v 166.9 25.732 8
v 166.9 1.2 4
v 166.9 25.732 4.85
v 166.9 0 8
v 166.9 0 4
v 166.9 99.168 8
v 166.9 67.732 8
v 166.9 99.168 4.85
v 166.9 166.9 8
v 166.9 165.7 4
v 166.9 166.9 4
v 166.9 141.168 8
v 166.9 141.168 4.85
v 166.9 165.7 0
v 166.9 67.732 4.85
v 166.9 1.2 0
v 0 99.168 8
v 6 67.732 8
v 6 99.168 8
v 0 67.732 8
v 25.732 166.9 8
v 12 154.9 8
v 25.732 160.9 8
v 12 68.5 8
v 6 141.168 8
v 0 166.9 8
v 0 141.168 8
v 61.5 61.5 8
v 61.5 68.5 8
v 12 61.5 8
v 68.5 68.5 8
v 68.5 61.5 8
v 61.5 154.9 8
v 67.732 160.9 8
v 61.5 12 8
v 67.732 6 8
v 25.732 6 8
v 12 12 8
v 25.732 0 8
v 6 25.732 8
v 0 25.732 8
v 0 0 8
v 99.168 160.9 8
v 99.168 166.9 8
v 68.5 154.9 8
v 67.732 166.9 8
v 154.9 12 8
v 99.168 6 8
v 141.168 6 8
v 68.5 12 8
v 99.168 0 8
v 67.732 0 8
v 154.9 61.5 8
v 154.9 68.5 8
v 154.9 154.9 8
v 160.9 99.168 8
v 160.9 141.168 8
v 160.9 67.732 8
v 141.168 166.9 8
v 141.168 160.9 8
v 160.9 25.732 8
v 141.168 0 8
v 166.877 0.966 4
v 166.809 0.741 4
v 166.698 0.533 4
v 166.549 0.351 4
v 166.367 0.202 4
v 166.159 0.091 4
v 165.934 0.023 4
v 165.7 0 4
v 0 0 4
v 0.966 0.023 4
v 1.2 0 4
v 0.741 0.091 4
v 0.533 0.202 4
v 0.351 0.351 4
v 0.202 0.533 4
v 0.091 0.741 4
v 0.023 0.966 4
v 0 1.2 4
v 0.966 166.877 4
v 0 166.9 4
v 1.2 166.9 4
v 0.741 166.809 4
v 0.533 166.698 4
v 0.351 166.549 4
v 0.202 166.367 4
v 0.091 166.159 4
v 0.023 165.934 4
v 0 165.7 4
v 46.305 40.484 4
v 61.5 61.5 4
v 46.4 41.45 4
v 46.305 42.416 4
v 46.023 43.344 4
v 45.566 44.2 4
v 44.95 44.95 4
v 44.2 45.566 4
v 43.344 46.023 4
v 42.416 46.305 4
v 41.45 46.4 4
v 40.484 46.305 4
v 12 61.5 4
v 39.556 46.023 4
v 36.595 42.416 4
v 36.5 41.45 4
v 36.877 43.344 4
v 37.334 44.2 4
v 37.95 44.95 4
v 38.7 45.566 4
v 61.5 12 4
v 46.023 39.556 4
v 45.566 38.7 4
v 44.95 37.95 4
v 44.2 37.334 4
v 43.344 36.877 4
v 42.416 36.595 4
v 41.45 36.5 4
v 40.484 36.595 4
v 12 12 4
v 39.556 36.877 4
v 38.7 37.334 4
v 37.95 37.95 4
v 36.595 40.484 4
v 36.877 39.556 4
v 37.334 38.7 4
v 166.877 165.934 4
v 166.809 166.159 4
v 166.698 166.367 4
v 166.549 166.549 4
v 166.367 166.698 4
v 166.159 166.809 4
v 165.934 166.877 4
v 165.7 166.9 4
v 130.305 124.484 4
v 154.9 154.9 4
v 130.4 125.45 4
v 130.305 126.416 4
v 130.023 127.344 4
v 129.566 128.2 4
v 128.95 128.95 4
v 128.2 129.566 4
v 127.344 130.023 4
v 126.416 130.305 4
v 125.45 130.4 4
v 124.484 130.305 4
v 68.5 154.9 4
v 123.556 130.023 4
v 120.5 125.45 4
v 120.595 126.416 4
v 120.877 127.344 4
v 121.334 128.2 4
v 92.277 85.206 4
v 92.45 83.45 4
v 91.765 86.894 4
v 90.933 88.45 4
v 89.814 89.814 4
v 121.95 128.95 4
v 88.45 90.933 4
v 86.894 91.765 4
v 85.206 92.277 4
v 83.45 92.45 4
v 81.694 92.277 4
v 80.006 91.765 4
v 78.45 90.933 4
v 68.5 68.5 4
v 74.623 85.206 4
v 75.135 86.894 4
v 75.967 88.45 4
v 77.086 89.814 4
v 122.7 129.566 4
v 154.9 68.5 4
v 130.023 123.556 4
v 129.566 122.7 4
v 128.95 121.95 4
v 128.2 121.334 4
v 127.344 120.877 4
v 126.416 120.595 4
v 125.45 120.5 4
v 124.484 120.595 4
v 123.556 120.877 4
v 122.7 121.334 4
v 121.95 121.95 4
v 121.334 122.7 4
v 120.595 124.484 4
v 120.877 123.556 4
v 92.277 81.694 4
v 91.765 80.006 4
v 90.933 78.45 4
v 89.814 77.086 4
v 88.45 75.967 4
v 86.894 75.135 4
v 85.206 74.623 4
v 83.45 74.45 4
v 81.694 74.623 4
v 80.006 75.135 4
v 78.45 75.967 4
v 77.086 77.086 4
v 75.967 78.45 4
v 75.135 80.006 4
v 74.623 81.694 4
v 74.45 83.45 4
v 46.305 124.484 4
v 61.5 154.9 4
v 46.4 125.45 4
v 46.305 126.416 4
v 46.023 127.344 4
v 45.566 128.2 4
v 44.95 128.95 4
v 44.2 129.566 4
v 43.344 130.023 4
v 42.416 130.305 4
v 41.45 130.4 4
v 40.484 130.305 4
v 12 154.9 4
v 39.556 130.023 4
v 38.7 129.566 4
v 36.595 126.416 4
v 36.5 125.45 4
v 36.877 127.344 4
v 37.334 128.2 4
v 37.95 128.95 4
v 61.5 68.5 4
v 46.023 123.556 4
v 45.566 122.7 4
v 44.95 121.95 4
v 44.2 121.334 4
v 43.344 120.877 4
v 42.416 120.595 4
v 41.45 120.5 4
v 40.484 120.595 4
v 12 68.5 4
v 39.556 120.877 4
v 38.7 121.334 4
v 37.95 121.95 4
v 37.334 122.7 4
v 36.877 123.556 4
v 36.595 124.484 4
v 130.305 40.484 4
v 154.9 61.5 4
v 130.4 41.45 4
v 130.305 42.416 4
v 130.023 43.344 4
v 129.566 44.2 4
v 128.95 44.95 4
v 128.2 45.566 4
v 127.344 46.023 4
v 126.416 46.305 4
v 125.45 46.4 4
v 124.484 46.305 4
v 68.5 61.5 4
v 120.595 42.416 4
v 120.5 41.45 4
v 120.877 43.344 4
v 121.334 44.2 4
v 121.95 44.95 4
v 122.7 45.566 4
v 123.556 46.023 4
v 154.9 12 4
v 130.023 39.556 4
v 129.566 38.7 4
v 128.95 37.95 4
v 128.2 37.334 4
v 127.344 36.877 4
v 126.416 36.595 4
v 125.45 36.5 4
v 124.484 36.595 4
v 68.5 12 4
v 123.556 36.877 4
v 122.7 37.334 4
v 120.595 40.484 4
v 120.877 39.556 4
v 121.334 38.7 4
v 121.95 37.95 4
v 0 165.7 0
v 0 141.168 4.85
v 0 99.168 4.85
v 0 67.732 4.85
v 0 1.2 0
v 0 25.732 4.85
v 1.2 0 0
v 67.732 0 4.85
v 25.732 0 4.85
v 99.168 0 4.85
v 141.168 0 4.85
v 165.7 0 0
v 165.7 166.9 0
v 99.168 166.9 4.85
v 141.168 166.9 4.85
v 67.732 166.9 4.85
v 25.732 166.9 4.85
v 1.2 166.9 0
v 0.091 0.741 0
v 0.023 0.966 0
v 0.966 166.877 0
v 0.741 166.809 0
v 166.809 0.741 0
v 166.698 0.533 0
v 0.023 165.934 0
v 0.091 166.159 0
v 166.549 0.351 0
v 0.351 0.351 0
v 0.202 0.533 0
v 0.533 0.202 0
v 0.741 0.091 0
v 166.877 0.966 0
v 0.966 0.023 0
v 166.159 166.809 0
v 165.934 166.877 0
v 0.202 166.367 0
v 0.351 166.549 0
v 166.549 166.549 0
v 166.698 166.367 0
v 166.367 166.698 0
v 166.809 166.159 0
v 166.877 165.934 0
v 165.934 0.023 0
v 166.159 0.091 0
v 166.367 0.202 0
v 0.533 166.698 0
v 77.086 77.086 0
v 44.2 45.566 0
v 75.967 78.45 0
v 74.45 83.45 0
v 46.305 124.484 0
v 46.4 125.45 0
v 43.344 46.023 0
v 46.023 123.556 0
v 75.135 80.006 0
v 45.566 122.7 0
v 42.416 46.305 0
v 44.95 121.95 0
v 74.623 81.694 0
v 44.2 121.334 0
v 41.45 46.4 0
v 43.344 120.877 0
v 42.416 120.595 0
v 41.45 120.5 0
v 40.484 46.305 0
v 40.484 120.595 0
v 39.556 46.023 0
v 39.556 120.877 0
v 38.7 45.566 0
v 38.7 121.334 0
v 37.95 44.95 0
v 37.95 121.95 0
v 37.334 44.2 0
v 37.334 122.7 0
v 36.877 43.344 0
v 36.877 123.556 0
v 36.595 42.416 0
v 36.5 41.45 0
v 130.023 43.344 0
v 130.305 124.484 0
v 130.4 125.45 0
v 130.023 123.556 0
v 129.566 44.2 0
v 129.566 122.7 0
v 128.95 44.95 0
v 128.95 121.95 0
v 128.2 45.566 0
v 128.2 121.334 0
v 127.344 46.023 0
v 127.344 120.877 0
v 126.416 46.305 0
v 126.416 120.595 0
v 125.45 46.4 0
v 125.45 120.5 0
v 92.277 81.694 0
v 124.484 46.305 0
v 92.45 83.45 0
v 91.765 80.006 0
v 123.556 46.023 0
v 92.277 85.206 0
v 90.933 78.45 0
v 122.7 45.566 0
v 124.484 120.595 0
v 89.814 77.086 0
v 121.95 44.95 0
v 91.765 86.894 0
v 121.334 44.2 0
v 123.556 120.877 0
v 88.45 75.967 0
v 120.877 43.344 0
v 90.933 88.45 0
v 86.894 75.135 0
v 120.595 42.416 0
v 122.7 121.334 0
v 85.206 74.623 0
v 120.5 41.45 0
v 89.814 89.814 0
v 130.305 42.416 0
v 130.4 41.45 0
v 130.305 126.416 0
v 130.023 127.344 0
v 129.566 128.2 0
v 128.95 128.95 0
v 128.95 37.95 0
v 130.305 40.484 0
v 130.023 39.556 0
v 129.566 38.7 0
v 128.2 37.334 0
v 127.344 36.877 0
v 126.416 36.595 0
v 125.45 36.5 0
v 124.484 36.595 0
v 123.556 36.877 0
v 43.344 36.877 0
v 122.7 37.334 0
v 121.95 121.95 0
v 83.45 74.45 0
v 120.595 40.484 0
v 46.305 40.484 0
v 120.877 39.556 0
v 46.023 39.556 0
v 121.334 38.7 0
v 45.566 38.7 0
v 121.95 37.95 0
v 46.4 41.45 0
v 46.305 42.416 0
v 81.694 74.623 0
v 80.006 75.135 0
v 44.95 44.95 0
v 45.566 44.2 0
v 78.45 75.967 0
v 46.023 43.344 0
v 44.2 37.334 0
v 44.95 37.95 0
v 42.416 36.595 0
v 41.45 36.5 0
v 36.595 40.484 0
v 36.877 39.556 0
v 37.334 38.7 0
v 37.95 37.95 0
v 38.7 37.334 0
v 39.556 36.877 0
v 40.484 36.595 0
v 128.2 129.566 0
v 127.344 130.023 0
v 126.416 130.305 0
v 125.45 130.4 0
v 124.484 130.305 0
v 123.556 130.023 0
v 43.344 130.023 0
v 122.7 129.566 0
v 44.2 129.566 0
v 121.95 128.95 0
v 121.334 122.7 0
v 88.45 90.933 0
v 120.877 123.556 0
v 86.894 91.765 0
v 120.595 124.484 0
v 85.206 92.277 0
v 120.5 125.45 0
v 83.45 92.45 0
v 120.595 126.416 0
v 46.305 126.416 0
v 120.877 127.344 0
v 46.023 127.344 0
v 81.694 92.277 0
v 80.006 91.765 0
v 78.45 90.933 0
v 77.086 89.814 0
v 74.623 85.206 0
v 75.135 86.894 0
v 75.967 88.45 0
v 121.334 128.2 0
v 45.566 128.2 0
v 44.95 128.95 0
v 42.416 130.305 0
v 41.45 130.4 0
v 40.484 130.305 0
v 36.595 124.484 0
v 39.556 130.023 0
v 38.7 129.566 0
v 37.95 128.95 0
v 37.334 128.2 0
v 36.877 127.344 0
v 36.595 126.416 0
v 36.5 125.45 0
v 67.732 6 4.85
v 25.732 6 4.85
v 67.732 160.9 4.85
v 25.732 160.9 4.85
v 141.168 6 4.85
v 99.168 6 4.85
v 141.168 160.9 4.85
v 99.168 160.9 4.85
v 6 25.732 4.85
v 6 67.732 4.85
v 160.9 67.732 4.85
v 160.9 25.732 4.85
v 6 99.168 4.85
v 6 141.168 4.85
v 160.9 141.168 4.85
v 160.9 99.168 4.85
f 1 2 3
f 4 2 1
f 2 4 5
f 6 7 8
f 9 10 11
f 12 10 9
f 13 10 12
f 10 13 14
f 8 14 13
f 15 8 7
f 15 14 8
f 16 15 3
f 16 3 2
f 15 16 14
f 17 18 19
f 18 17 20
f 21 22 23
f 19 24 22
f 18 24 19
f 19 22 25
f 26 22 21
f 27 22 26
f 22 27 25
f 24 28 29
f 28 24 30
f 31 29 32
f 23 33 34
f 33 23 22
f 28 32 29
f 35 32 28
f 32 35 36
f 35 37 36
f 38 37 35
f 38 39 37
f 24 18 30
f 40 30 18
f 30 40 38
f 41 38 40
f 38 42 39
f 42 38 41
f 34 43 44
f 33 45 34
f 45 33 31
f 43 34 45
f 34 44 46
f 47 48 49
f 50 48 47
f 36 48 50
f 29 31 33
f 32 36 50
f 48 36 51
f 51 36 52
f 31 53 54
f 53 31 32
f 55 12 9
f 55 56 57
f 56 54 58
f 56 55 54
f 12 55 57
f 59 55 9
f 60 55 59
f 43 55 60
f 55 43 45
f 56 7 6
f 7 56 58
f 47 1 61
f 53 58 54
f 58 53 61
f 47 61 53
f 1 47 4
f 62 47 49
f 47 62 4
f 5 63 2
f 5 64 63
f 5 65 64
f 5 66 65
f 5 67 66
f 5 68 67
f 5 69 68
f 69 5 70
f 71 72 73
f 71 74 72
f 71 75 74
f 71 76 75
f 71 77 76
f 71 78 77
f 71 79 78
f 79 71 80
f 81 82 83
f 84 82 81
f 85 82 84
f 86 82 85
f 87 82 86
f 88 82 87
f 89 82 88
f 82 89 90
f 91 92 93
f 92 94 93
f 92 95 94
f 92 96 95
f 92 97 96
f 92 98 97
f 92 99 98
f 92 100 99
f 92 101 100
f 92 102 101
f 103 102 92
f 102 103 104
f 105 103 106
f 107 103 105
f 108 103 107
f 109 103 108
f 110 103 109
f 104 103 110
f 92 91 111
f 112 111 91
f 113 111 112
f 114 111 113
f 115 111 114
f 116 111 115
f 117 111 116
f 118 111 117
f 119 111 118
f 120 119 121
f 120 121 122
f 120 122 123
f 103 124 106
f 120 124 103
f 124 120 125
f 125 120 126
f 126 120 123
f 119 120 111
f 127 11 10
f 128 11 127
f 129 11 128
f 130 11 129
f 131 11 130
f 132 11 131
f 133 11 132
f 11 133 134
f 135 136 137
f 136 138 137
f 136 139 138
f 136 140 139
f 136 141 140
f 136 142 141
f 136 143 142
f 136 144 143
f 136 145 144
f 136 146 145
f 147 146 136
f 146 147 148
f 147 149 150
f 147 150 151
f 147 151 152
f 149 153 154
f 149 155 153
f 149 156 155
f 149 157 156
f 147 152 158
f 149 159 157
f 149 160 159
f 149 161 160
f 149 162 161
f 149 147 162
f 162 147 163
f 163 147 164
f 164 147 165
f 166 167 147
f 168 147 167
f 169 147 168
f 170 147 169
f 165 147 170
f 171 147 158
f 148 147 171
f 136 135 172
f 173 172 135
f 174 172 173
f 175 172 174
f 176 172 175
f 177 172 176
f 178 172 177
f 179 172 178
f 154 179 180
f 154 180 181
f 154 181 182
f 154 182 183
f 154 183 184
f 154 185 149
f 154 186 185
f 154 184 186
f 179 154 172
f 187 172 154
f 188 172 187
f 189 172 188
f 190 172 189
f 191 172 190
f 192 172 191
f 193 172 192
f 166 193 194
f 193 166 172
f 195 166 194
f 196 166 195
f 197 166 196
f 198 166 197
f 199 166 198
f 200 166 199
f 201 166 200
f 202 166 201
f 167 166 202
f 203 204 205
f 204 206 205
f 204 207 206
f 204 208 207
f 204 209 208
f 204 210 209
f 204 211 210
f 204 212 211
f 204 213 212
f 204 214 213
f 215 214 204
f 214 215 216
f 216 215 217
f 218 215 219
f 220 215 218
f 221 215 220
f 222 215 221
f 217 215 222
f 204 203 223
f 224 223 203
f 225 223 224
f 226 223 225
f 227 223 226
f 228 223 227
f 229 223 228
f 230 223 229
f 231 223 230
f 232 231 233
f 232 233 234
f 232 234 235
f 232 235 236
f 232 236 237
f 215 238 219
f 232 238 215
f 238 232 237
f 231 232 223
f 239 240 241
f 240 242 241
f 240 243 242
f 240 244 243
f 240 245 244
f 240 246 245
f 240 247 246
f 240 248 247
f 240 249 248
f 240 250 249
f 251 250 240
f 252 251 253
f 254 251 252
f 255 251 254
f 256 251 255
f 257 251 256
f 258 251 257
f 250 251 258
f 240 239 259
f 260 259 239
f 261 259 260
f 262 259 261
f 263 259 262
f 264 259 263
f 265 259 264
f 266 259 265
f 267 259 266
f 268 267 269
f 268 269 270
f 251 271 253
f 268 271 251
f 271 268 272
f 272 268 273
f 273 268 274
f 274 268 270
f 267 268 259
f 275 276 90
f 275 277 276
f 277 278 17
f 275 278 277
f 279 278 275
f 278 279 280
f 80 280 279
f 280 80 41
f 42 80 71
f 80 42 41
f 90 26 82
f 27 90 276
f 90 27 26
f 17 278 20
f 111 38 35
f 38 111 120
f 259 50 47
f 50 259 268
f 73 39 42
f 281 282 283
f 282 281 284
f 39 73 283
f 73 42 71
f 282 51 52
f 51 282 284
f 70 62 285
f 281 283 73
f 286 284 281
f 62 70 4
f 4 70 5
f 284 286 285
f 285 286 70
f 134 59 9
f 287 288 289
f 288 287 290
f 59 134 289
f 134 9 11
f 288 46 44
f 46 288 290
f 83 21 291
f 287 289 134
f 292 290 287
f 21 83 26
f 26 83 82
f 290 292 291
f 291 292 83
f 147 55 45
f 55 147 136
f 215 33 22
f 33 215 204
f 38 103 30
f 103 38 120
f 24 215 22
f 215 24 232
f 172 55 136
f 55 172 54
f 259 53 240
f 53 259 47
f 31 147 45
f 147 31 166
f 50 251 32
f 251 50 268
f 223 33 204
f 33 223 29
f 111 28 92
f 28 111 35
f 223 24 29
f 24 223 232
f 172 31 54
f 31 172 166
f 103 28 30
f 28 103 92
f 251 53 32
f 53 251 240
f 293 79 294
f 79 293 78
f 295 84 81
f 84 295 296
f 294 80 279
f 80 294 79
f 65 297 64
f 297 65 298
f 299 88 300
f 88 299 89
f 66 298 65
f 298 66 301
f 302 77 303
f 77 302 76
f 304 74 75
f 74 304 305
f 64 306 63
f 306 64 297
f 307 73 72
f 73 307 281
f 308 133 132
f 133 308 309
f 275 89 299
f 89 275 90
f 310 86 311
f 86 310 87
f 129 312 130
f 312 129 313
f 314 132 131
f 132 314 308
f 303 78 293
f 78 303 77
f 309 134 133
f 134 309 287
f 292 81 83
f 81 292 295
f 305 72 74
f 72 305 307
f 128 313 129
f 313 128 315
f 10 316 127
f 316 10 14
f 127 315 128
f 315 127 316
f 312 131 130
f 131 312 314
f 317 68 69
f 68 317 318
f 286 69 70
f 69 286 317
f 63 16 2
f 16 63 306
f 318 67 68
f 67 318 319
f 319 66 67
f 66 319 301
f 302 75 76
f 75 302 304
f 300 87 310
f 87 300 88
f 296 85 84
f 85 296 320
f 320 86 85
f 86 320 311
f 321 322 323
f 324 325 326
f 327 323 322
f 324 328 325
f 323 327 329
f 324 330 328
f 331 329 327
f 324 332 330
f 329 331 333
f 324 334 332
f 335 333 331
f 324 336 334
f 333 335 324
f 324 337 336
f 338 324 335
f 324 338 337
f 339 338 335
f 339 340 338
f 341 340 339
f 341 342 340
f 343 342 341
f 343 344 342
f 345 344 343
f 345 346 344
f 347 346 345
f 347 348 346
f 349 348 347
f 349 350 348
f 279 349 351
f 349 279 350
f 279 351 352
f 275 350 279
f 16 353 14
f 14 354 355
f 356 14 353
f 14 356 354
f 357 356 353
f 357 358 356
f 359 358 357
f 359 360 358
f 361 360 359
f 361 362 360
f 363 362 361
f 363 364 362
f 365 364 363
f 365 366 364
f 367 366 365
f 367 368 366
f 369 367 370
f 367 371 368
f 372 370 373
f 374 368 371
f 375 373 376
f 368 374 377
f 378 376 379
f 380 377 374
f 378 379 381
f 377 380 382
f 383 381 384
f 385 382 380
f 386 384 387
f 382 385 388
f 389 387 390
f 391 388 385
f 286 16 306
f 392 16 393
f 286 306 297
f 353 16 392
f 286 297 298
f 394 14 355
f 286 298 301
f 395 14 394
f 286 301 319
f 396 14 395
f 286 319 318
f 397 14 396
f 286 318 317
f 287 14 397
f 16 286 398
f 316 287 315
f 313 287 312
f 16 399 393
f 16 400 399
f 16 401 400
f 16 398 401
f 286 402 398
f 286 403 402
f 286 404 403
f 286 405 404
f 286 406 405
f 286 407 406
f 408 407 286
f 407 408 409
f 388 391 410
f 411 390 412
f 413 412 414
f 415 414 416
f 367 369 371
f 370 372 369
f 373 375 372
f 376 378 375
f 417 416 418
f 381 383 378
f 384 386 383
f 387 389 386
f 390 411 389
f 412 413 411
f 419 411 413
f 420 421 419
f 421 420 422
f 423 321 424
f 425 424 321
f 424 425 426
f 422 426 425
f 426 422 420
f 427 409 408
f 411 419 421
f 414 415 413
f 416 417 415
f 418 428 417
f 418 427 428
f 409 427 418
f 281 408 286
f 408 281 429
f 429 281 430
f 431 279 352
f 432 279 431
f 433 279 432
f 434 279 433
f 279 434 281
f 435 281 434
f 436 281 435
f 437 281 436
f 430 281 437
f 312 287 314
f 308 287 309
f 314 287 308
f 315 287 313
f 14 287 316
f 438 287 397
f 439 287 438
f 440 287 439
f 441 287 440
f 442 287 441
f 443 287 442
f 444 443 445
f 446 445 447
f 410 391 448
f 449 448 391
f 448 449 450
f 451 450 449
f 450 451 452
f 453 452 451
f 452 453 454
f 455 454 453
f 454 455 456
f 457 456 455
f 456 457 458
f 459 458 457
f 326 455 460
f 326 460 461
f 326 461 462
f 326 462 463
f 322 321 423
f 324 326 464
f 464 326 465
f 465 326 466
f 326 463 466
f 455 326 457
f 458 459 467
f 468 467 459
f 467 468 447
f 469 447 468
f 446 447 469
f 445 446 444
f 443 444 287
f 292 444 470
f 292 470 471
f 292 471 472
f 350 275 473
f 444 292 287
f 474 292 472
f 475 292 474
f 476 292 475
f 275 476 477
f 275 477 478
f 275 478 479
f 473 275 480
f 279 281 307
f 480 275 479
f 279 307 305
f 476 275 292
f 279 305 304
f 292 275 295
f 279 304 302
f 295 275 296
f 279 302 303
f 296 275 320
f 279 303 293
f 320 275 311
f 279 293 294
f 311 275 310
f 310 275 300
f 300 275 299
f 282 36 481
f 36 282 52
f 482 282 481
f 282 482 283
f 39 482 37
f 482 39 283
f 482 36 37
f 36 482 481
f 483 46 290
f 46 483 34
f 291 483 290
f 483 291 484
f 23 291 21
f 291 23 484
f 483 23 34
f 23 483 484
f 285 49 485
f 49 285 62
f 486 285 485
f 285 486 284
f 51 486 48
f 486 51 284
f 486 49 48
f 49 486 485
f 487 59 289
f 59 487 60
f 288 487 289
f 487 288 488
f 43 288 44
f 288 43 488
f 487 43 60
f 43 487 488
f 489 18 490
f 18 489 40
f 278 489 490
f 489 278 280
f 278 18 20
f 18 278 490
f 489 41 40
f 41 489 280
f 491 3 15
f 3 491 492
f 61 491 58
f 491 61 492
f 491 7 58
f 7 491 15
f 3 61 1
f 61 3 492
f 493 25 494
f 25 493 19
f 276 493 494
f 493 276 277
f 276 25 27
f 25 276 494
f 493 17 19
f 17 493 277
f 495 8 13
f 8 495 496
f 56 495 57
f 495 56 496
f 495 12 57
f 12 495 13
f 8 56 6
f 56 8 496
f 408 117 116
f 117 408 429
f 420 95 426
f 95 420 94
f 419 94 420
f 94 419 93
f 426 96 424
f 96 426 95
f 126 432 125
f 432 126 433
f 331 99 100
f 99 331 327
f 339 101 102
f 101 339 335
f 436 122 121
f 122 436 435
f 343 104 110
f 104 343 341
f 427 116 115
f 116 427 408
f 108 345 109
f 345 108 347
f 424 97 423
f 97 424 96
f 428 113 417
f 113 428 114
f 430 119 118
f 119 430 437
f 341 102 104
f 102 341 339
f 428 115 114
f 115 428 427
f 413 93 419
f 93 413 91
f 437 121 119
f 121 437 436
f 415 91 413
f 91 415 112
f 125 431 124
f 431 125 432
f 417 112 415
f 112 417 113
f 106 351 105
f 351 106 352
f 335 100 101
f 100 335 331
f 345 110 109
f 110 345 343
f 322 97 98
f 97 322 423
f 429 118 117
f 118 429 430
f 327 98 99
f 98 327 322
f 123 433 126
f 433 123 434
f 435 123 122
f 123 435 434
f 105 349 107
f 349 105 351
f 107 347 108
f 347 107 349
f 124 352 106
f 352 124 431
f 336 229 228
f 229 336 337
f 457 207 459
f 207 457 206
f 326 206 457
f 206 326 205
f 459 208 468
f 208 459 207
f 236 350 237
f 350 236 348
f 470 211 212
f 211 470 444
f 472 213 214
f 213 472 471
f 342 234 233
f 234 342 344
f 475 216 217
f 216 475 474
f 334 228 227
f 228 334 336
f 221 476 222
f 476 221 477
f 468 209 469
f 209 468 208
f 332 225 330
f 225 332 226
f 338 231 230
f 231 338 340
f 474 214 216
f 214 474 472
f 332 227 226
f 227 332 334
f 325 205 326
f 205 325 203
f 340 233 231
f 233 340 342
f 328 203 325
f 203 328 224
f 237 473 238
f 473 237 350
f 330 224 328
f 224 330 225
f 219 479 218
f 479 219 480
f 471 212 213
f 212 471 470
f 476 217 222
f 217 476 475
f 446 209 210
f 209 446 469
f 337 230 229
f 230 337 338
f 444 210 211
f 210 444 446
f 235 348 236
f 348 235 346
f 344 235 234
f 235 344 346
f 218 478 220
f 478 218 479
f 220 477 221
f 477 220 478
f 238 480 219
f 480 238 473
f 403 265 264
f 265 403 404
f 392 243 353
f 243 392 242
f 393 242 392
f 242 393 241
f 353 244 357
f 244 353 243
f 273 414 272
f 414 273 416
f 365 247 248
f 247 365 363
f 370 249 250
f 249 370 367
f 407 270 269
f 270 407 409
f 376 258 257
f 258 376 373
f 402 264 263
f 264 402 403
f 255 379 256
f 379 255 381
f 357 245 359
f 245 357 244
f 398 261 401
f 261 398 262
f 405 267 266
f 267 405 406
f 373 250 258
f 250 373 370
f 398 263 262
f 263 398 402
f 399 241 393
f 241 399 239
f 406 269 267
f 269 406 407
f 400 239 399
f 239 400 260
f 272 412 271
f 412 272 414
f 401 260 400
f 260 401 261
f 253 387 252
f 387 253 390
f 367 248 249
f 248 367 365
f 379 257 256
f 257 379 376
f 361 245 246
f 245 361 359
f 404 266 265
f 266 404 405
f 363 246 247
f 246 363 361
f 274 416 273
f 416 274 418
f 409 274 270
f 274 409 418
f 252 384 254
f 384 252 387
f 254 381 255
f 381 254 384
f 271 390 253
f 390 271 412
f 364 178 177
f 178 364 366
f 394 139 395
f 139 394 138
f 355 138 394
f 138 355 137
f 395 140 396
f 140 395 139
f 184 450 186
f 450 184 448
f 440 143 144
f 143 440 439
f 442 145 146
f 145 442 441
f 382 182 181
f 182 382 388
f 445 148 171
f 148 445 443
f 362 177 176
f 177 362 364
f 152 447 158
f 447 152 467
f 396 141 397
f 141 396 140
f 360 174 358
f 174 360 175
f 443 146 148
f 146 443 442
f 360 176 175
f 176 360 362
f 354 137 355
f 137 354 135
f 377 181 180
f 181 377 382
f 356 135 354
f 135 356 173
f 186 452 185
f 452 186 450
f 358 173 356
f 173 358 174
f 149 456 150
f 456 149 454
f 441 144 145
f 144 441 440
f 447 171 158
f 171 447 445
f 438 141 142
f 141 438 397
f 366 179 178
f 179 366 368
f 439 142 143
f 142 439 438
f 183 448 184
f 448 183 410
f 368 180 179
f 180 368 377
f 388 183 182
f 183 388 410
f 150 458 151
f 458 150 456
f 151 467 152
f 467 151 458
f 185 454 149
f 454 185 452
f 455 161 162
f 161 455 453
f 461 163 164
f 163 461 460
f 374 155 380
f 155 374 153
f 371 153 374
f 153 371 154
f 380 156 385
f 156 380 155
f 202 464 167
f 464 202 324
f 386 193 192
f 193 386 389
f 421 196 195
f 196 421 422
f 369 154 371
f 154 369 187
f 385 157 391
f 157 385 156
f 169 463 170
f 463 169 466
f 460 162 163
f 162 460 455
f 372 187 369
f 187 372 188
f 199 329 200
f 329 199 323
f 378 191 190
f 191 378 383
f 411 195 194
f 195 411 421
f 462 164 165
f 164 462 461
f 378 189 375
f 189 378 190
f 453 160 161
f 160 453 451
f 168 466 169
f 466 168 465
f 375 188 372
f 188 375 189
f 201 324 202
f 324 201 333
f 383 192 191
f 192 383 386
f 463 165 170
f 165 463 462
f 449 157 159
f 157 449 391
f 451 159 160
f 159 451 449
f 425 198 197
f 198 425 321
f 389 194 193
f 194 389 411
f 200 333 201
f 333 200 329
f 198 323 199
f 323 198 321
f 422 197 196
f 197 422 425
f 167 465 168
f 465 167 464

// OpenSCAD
/*
Bottom inner liner tile with drain holes.
Print orientation: large soil-facing face on the bed, ribs and key recesses upward.
Quantity: one per bottom grid position.
*/

use <../planter_support_free.scad>

export_bottom_inner_tile();
